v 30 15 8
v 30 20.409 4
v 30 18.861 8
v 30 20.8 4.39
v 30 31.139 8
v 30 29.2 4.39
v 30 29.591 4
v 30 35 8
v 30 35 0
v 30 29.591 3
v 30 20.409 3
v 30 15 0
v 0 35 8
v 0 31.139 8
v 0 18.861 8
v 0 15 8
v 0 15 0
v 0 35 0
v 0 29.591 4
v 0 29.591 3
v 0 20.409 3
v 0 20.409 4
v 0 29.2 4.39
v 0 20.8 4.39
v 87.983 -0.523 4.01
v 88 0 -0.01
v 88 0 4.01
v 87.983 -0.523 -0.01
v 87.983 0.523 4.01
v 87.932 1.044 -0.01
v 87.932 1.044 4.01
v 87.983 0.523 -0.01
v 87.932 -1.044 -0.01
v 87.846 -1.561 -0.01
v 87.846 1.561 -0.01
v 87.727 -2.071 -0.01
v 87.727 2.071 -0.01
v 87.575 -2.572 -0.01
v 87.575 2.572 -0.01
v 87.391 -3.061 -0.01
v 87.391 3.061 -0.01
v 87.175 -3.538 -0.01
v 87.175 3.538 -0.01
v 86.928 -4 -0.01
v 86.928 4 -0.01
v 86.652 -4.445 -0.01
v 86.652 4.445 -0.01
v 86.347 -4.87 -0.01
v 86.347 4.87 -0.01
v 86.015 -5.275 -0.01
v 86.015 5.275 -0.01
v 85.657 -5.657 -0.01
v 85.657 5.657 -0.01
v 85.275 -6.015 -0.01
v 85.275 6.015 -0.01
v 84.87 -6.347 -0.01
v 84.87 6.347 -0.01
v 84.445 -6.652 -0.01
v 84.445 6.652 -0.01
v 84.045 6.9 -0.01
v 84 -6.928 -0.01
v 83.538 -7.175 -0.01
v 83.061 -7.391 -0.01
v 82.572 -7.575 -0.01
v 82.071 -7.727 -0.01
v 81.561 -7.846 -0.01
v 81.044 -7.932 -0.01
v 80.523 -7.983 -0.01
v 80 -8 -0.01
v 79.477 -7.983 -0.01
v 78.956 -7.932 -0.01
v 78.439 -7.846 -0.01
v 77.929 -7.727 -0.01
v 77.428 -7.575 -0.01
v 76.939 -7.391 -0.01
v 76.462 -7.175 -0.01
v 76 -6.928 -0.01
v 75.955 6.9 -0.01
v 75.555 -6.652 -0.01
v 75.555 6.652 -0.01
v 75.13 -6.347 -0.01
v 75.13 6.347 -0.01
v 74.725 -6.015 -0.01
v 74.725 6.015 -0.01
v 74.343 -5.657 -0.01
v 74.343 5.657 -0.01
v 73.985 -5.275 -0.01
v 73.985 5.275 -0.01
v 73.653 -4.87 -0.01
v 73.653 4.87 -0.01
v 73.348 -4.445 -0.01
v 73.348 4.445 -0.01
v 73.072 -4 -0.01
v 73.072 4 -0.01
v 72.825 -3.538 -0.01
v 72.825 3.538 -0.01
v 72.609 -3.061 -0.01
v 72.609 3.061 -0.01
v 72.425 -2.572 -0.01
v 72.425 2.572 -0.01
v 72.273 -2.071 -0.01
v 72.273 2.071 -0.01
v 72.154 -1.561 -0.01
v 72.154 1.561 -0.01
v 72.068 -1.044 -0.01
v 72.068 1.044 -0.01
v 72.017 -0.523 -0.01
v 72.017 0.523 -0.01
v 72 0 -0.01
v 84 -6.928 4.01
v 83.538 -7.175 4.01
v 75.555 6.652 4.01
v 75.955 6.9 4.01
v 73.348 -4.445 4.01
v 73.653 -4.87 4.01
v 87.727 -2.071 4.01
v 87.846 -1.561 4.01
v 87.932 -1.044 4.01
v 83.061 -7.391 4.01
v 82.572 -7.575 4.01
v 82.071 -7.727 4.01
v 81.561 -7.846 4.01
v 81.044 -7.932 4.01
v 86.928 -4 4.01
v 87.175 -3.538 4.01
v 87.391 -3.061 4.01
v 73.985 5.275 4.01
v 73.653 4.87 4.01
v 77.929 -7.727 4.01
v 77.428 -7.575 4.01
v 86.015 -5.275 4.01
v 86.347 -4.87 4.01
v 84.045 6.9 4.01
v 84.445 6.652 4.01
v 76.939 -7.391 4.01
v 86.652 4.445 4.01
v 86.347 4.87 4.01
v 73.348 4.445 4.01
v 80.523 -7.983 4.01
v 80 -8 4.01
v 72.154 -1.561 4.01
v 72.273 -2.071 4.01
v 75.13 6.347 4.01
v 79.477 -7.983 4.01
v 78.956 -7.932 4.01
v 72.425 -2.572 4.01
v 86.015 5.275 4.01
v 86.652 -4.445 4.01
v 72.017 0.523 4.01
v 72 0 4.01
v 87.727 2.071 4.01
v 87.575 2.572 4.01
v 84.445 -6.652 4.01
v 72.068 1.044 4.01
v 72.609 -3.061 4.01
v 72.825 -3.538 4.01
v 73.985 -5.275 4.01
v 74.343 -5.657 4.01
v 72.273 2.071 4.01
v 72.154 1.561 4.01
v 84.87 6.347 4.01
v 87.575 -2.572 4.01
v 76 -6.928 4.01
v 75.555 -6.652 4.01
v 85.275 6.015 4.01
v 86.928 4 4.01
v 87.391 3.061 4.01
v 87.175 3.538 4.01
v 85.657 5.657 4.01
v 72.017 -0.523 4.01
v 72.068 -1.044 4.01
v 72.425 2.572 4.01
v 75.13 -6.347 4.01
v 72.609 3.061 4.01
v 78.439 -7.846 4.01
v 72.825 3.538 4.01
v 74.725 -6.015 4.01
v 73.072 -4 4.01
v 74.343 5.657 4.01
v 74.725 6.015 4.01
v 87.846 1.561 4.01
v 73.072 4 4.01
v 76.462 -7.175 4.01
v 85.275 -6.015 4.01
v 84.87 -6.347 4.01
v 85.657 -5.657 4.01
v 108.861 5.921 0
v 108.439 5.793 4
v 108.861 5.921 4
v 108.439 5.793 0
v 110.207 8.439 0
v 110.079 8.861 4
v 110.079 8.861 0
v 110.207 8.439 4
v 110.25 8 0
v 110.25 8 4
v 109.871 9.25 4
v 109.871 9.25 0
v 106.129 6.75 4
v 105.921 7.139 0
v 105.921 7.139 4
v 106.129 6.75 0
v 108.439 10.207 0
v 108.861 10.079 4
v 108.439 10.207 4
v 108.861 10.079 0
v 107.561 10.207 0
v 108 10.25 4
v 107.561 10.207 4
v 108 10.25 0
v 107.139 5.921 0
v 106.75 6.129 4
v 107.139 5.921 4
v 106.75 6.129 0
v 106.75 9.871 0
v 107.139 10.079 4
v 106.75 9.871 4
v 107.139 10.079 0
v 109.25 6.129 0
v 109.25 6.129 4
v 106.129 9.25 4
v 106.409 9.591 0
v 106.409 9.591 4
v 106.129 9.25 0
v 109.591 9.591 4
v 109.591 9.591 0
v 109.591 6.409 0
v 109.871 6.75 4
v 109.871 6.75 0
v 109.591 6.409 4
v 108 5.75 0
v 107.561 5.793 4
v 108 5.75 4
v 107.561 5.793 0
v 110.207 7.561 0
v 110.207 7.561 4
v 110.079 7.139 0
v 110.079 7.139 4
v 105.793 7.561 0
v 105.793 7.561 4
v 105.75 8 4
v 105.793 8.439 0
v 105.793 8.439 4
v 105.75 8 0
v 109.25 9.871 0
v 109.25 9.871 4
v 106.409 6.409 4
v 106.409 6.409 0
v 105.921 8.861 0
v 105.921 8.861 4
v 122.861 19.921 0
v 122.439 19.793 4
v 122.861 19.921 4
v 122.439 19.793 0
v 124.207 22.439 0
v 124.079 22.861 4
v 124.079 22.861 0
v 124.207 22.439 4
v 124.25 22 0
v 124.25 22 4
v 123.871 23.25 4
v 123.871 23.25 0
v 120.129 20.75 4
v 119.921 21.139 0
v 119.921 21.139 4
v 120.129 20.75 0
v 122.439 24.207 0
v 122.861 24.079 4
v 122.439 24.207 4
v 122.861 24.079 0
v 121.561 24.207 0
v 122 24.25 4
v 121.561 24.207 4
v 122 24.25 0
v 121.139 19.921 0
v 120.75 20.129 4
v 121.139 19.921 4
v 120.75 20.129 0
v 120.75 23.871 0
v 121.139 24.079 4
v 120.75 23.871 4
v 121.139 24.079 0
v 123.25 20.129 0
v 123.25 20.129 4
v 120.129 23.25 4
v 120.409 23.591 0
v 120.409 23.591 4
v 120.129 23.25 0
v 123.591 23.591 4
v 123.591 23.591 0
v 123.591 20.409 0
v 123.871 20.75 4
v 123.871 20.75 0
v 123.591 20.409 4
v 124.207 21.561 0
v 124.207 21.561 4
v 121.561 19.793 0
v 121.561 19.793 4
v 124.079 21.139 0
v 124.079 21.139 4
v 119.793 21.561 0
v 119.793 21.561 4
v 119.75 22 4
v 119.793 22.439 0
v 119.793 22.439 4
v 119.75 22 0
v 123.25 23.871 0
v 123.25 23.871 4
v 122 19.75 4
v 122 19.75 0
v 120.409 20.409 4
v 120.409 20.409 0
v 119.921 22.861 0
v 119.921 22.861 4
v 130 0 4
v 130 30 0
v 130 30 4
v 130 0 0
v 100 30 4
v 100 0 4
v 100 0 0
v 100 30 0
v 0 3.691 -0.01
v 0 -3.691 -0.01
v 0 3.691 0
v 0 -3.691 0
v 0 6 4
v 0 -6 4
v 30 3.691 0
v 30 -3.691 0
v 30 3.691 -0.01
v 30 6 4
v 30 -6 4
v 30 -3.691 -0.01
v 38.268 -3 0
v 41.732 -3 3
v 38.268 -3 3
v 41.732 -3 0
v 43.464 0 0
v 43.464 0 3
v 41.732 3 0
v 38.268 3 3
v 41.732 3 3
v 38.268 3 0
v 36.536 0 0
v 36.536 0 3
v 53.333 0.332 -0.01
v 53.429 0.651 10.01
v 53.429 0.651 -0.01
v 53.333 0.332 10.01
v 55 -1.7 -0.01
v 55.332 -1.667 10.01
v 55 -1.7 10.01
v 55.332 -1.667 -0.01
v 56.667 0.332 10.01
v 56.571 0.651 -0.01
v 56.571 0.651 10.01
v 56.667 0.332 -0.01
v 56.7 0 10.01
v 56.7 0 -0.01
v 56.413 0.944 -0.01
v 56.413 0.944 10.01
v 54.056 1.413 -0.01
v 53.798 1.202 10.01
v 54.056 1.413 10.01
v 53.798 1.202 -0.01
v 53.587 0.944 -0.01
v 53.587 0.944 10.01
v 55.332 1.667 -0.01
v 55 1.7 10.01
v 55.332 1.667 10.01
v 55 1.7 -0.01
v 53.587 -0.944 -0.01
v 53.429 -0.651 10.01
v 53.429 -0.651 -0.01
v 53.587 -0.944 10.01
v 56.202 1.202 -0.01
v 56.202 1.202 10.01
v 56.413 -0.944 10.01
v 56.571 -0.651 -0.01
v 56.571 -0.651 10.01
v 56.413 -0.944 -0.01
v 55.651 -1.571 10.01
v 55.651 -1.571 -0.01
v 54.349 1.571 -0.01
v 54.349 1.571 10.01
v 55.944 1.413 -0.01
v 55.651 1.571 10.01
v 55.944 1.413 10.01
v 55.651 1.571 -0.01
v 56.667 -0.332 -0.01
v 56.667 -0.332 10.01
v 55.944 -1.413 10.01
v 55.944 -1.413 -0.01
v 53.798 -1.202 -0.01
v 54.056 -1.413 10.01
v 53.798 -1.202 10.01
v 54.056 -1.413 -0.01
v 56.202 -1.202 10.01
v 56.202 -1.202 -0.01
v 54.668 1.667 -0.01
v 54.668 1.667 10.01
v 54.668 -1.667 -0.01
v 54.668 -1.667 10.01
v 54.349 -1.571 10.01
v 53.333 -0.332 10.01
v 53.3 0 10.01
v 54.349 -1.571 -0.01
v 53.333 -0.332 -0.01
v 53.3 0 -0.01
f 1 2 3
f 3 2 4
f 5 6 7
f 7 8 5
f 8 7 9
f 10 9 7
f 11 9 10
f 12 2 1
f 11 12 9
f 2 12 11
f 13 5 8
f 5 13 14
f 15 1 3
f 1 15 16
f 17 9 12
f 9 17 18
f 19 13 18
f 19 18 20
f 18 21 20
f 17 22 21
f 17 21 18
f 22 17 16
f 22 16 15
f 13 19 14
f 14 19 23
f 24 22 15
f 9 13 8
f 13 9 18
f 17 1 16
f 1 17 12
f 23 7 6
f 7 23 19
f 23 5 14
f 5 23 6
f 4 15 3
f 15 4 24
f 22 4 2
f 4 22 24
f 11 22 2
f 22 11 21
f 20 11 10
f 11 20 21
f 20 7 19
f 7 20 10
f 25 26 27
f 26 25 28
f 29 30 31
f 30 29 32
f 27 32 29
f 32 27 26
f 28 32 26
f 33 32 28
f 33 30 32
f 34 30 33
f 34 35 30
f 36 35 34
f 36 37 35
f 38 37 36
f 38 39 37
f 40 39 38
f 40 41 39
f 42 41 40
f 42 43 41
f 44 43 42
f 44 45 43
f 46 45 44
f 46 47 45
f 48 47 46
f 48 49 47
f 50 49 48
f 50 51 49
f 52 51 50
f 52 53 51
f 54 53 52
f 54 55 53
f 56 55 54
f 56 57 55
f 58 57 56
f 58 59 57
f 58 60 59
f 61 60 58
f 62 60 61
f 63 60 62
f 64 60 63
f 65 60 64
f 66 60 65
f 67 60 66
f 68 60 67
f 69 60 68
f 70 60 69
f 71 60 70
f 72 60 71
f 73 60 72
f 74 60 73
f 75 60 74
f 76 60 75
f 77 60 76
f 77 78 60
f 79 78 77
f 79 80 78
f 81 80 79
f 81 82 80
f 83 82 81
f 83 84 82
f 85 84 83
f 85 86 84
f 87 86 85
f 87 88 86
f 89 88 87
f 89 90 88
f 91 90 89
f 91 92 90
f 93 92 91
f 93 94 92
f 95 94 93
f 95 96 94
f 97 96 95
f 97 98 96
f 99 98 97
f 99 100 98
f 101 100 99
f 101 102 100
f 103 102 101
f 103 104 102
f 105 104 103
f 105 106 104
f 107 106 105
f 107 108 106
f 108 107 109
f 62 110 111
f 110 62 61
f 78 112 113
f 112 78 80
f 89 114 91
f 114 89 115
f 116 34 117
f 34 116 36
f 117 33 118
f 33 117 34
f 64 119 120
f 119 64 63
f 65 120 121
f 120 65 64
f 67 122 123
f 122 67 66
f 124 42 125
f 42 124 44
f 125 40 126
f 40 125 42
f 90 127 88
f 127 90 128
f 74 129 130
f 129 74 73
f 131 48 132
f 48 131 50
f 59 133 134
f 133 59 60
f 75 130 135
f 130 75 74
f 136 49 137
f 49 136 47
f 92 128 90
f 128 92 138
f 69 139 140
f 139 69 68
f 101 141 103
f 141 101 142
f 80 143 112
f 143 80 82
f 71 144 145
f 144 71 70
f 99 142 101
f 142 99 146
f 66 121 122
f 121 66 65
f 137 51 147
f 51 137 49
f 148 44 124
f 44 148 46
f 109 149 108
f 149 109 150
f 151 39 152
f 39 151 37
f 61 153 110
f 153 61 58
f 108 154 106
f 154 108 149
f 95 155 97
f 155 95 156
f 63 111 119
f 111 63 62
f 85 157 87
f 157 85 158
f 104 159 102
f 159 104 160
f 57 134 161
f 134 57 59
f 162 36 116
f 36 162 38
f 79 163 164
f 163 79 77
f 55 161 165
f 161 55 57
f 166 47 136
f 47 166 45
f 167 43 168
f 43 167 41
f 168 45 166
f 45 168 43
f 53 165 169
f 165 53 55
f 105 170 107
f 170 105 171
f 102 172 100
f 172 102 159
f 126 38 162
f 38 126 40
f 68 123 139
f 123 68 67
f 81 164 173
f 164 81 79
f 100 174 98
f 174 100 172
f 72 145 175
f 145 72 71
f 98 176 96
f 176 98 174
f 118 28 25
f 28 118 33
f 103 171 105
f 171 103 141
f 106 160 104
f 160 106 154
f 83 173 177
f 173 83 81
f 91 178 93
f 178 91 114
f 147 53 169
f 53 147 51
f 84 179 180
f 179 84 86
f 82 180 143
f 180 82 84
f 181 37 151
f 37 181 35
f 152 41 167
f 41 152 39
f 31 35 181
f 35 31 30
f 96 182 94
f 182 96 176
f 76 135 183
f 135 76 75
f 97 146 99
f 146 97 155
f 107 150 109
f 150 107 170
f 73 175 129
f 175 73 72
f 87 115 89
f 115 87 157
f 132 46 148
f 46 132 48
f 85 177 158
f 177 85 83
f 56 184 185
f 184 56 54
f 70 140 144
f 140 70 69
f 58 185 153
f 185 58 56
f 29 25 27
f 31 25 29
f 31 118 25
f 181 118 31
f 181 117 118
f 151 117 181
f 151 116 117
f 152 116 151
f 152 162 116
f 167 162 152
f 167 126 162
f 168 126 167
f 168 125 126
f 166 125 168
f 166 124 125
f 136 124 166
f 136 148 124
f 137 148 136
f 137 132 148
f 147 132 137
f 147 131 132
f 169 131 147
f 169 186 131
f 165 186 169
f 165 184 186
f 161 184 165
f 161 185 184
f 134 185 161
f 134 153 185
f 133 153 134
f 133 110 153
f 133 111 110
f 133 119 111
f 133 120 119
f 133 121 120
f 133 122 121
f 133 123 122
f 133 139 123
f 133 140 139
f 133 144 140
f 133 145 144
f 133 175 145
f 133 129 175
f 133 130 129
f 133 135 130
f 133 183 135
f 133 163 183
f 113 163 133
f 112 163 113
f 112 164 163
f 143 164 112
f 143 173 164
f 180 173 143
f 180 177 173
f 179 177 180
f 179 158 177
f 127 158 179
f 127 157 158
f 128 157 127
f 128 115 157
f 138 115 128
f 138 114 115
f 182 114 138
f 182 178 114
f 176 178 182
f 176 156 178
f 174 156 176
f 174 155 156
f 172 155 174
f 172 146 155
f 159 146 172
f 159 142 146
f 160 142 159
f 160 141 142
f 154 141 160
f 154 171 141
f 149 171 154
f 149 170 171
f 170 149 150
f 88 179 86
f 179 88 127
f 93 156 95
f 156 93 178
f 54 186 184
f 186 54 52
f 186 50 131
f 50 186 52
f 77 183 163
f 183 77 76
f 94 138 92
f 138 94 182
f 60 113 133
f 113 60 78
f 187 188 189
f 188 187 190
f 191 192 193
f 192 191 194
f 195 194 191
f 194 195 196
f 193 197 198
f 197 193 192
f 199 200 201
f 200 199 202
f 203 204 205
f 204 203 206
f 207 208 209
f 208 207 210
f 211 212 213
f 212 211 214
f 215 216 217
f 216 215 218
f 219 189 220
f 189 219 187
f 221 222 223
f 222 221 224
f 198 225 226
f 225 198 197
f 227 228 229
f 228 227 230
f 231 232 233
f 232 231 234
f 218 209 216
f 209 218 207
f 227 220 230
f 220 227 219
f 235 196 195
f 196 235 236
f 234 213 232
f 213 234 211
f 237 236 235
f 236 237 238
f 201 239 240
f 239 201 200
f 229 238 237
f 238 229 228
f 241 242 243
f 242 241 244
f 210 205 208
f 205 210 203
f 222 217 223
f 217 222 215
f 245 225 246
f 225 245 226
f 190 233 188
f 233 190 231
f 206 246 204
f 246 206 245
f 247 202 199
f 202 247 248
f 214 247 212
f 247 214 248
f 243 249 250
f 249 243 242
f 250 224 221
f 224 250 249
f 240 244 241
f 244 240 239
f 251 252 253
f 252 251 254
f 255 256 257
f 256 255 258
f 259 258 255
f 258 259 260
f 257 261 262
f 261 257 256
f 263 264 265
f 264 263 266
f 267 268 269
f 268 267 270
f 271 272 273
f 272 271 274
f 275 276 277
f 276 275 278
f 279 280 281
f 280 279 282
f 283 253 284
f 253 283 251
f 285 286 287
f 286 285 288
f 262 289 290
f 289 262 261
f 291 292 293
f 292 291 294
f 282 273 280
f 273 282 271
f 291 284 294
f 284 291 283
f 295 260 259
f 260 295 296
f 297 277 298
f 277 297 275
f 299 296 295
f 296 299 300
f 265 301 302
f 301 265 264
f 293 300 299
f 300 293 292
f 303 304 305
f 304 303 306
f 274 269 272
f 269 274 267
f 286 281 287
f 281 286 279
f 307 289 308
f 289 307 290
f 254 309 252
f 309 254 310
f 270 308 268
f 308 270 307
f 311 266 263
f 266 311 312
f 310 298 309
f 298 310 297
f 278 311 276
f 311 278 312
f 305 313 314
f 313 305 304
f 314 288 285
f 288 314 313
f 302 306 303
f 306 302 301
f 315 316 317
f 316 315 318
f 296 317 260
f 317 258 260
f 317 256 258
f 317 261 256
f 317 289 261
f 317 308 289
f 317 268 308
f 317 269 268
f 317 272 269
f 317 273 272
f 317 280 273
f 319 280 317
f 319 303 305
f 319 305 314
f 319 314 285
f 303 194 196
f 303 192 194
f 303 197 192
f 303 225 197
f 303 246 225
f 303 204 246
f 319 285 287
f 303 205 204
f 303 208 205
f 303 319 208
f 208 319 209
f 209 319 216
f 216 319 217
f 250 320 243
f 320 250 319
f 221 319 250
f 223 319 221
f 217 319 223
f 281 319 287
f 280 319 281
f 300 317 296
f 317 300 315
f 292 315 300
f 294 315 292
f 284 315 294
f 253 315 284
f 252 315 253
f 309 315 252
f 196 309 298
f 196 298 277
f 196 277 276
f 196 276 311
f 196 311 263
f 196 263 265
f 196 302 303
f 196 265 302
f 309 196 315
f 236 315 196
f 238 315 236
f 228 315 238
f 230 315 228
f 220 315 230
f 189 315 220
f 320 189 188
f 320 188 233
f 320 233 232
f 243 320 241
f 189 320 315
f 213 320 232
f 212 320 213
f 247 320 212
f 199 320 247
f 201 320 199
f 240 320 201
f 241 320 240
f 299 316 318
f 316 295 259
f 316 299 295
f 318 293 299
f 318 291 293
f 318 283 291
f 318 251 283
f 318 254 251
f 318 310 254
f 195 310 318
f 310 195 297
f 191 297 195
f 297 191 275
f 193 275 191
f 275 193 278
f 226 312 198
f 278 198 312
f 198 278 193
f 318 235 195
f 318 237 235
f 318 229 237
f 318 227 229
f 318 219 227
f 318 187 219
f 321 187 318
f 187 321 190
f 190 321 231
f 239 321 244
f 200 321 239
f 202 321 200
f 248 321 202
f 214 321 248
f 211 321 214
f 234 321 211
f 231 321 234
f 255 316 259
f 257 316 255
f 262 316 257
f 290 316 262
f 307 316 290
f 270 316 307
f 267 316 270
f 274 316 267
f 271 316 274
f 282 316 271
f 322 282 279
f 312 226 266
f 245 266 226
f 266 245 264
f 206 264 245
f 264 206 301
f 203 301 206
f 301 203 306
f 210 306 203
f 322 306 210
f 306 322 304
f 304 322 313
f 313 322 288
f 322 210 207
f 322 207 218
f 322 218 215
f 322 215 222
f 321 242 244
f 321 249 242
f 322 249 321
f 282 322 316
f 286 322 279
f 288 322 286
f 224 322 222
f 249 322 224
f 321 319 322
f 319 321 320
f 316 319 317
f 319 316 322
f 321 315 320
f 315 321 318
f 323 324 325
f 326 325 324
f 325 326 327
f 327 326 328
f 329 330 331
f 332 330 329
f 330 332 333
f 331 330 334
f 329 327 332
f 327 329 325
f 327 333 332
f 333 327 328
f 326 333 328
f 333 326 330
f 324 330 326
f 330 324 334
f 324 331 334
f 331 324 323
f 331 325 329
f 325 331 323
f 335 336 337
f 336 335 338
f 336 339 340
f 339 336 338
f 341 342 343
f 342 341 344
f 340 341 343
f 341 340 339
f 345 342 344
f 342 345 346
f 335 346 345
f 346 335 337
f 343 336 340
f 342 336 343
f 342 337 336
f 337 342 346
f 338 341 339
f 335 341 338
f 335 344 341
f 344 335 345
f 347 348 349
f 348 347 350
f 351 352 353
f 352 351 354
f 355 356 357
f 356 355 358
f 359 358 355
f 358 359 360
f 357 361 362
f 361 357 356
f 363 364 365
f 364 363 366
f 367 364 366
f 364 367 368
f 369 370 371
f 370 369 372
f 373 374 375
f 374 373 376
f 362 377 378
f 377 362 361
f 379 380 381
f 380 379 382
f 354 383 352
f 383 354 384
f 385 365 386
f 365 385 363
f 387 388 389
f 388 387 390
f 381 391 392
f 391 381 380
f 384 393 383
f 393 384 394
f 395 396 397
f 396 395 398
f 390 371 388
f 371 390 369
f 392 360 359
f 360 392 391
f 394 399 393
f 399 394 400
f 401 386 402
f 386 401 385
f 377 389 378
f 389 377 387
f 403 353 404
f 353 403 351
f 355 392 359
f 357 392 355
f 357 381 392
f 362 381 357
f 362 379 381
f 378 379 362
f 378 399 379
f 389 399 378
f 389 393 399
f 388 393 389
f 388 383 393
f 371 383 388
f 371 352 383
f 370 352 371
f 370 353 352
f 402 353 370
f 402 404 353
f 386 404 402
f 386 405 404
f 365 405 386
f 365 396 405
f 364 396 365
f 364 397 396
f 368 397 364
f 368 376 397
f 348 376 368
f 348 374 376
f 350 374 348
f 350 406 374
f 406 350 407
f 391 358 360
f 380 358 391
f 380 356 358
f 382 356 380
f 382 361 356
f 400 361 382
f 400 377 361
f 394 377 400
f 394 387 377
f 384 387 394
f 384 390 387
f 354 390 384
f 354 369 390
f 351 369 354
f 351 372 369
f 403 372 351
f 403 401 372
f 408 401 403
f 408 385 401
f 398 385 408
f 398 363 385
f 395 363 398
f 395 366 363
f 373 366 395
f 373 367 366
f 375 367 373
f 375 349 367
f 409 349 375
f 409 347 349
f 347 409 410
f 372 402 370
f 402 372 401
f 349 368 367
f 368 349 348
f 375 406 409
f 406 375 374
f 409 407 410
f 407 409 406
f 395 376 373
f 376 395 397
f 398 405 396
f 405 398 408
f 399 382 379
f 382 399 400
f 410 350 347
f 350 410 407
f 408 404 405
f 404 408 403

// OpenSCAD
// Smoke test: every lib.scad core module renders, side by side.
include <../../lib.scad>

dovetail_rail(30);
translate([0, 25, 0]) difference() {
    translate([0, -10, 0]) cube([30, 20, 8]);
    translate([0, 0, 8 - dt_h]) dovetail_slot(30);
}
translate([40, 0, 0]) m3_nut_trap(3);
translate([55, 0, 0]) screw_hole(m3_d, 10);
translate([80, 0, 0]) d_hole(t = plate_t);
translate([100, 0, 0]) difference() {
    cube([30, 30, 4]);
    wood_screw_holes([[8, 8], [22, 22]], 4);
}

echo("CHECK", "d_hole_flat", bh_flat + bh_flat_clr);
